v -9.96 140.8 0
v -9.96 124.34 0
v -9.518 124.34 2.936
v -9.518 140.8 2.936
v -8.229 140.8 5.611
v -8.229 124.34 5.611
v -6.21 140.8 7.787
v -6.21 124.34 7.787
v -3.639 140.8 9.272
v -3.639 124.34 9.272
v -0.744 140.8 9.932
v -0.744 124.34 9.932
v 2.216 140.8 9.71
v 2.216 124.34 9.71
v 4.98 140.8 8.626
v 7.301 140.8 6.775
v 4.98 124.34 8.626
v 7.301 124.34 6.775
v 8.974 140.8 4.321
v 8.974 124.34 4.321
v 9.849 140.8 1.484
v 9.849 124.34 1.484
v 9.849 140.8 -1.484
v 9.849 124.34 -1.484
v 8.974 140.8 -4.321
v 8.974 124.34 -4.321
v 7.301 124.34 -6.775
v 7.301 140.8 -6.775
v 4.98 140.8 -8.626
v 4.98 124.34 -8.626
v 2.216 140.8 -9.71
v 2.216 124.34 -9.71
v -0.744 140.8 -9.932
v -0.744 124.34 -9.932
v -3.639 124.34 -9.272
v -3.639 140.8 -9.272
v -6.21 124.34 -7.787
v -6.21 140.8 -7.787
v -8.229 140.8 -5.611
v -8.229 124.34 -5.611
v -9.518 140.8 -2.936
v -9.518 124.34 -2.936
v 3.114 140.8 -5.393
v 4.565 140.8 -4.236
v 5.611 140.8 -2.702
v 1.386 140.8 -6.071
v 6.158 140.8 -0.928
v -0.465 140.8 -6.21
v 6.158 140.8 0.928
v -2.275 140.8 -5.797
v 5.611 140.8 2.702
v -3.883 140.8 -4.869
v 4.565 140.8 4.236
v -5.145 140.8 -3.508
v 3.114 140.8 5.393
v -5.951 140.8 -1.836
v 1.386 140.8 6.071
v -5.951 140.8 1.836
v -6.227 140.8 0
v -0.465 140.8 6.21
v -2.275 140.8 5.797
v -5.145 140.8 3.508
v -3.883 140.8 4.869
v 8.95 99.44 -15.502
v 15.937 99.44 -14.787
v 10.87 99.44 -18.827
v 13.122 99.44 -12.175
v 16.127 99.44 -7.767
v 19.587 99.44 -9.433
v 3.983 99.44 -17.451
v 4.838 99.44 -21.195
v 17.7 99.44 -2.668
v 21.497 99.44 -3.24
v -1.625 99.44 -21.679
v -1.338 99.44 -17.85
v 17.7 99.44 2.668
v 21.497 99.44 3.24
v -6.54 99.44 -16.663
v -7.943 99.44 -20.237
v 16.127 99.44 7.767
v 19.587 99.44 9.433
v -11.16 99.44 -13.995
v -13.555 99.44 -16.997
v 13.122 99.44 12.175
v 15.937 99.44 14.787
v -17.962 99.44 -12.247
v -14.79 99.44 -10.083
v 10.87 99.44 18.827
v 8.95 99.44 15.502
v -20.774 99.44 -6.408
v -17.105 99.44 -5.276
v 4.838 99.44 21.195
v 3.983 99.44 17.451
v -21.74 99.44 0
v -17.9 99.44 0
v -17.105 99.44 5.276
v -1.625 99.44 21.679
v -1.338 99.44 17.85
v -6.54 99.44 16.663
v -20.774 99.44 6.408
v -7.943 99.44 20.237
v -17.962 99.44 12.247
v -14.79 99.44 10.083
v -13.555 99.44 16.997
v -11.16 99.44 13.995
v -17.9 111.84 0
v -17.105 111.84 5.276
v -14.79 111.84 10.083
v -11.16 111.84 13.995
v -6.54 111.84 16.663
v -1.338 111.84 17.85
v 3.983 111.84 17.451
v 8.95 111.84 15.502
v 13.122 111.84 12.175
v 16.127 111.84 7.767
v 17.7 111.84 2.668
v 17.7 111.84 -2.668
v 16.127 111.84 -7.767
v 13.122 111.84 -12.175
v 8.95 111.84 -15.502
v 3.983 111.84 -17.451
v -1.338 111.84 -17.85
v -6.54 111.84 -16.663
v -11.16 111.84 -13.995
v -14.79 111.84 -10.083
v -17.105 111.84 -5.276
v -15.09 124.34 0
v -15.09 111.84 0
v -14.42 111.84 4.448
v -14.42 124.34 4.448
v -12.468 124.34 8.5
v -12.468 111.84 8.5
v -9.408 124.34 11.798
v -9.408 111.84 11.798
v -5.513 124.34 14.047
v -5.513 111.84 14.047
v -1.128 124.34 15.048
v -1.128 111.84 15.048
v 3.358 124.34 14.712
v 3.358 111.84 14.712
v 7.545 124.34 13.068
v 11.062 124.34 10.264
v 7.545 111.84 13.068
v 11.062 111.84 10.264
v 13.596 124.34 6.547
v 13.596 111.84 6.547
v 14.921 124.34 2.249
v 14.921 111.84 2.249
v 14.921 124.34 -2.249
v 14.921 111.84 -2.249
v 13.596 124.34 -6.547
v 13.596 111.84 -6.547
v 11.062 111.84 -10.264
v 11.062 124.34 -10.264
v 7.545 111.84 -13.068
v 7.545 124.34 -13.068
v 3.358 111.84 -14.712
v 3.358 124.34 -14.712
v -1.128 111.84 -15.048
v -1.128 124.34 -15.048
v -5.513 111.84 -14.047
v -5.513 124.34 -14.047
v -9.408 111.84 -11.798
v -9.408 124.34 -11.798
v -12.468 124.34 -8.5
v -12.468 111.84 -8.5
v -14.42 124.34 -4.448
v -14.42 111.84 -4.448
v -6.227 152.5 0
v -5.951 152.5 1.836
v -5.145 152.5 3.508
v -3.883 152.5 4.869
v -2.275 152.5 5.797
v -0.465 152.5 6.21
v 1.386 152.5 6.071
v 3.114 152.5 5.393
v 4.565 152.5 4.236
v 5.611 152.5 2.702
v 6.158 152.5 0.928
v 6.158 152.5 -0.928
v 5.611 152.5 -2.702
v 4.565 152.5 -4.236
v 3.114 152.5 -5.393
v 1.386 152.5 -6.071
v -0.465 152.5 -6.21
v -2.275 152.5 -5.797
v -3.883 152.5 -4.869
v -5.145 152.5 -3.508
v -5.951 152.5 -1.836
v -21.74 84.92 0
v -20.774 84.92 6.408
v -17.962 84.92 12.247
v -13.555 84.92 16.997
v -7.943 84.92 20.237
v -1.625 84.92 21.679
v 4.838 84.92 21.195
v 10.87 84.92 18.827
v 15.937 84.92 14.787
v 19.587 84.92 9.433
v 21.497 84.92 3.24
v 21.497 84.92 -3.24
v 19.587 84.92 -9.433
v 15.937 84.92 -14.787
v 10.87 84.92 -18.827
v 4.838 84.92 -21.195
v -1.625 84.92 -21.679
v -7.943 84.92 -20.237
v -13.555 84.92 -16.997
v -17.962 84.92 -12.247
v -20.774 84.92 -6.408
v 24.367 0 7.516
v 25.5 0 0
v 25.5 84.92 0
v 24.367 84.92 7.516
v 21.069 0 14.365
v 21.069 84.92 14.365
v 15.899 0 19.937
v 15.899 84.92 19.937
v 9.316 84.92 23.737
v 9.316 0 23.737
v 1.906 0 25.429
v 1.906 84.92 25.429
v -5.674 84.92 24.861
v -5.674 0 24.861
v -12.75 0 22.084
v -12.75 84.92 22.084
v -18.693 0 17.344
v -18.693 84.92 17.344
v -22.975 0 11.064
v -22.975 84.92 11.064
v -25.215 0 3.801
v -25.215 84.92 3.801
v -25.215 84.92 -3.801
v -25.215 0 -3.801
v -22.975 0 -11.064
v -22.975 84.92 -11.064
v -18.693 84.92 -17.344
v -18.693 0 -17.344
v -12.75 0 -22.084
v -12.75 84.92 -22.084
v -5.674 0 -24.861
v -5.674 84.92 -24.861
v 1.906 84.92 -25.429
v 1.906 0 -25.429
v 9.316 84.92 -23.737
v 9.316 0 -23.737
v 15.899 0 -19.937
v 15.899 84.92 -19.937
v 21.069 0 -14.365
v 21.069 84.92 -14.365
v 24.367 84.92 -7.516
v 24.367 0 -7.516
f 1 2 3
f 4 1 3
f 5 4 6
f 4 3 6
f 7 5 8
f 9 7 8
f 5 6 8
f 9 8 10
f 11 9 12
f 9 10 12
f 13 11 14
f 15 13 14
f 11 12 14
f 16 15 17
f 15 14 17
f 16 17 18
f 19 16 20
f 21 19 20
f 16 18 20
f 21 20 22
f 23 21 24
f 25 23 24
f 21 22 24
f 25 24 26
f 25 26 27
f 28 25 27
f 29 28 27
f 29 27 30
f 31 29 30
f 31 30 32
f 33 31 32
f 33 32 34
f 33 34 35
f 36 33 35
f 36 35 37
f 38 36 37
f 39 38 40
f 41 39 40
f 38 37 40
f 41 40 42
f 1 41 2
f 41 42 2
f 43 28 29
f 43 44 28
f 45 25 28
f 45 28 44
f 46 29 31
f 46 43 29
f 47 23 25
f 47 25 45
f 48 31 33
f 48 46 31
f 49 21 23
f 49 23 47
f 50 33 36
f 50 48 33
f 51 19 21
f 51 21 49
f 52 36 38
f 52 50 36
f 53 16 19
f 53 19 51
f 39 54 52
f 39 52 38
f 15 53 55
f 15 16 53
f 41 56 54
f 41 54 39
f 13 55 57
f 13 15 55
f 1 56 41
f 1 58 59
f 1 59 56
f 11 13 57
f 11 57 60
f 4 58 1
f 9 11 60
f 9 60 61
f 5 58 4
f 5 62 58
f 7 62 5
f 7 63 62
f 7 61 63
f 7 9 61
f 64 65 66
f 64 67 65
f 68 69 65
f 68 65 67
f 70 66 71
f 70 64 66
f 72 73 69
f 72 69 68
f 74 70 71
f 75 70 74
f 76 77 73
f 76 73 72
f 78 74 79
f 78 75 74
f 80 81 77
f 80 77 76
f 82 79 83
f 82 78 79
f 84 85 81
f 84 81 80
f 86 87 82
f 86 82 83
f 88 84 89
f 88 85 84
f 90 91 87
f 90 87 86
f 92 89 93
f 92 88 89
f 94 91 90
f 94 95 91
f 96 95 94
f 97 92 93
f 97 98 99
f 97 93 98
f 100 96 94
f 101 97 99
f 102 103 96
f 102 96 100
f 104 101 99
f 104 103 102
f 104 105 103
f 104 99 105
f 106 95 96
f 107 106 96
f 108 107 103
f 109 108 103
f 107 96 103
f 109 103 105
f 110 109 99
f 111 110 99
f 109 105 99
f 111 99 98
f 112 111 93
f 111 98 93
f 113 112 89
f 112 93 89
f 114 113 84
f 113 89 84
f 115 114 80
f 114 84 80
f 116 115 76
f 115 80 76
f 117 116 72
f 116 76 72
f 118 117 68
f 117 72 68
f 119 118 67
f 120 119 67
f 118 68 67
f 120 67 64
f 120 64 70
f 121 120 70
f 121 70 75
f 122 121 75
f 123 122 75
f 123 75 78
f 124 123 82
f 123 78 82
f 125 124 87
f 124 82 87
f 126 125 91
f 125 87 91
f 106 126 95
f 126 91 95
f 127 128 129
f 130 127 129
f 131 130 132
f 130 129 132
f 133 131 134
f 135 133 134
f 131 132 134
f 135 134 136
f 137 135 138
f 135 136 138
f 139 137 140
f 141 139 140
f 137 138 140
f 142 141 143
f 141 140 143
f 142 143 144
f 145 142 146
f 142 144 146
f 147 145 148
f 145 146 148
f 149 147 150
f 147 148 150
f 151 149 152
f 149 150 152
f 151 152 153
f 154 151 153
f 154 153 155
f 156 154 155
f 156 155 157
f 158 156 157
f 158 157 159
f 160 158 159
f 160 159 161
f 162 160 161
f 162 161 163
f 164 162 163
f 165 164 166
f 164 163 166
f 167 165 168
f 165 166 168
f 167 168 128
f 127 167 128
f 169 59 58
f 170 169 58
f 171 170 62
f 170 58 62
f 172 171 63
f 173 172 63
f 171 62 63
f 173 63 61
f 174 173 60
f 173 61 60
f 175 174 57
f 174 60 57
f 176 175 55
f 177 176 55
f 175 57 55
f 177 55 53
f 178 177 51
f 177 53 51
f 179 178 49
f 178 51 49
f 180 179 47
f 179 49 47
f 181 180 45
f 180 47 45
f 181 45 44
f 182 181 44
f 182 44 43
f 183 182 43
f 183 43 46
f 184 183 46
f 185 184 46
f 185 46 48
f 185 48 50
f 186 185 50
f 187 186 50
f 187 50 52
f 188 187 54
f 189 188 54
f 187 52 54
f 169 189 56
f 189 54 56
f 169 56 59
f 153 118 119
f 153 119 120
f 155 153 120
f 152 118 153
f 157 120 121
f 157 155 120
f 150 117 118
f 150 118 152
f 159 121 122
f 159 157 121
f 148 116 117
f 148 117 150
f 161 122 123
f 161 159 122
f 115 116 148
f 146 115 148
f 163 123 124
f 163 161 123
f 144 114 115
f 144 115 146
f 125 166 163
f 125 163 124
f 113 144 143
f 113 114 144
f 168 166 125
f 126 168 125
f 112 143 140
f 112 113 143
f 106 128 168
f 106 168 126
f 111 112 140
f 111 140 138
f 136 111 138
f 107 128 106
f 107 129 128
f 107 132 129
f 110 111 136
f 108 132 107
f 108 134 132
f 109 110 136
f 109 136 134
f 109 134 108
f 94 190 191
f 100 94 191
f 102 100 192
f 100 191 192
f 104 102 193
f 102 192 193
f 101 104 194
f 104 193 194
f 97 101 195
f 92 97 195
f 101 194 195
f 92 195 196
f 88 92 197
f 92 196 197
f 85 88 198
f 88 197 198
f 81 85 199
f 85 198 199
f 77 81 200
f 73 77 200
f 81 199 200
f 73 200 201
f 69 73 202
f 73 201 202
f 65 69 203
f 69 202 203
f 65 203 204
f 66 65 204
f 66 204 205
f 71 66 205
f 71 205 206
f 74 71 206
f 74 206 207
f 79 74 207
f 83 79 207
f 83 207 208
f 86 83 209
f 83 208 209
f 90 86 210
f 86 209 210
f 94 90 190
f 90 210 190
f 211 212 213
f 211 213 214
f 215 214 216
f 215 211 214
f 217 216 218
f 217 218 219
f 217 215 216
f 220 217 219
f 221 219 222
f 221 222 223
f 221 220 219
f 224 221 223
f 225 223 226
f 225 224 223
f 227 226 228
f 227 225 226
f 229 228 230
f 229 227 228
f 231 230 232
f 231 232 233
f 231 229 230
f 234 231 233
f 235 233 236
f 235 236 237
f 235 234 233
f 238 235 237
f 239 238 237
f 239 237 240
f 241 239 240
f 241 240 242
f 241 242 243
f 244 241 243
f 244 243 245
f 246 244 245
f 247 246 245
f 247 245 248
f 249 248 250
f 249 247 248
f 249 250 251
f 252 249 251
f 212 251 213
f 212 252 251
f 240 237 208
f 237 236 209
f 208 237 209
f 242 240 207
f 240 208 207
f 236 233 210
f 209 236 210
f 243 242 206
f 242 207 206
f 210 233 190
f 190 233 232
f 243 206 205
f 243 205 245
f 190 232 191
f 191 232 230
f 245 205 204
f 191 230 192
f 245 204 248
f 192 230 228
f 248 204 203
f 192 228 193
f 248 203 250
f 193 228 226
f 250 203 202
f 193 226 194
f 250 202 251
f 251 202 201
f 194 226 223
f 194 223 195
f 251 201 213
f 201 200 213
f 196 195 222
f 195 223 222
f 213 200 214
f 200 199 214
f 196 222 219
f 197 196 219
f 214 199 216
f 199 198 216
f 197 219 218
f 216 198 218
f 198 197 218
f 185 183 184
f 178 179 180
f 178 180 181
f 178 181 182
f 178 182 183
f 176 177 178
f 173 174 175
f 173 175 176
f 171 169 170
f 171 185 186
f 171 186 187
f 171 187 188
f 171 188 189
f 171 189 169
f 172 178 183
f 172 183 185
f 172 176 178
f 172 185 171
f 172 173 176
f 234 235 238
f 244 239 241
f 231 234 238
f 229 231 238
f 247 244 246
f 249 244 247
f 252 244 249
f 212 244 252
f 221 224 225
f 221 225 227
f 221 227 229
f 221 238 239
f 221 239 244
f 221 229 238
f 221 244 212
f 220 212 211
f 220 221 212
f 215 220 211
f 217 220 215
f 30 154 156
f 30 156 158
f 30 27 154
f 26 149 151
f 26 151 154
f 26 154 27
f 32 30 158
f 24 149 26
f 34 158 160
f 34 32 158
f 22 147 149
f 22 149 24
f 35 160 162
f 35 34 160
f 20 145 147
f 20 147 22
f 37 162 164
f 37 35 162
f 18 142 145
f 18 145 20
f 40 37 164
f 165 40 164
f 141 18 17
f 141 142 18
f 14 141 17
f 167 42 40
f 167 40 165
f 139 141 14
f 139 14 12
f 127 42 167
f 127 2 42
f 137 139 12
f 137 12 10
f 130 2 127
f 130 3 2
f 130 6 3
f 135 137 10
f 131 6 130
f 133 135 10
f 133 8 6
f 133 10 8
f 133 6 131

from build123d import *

# Parameters (mm, degrees)
F0_R      = 25.5
F1_DEPTH  = 84.92
F2_R      = 21.74
F3_DEPTH  = 14.52
F4_R      = 17.9
F5_DEPTH  = 12.4
F6_R      = 15.09
F7_DEPTH  = 12.5
F8_R      = 9.96
F9_DEPTH  = 16.46
F10_R     = 6.227418
F11_DEPTH = 11.7


with BuildPart() as f1:
    # F0 (on Front) → F1 (new body)
    with BuildSketch(Plane.XZ):
        Circle(F0_R)
    extrude(amount=-F1_DEPTH)

    # F2 (on face) → F3 (join)
    with BuildSketch(Plane(origin=(0, 84.92, 0), x_dir=(-1, 0, 0), z_dir=(0, 1, 0))):
        Circle(F2_R)
    extrude(amount=F3_DEPTH)

    # F4 (on face) → F5 (join)
    with BuildSketch(Plane(origin=(0, 99.44, 0), x_dir=(-1, 0, 0), z_dir=(0, 1, 0))):
        Circle(F4_R)
    extrude(amount=F5_DEPTH)

    # F6 (on face) → F7 (join)
    with BuildSketch(Plane(origin=(0, 111.84, 0), x_dir=(-1, 0, 0), z_dir=(0, 1, 0))):
        Circle(F6_R)
    extrude(amount=F7_DEPTH)

    # F8 (on face) → F9 (join)
    with BuildSketch(Plane(origin=(0, 124.34, 0), x_dir=(-1, 0, 0), z_dir=(0, 1, 0))):
        Circle(F8_R)
    extrude(amount=F9_DEPTH)

    # F10 (on face) → F11 (join)
    with BuildSketch(Plane(origin=(0, 140.8, 0), x_dir=(-1, 0, 0), z_dir=(0, 1, 0))):
        Circle(F10_R)
    extrude(amount=F11_DEPTH)


solid = f1.part
